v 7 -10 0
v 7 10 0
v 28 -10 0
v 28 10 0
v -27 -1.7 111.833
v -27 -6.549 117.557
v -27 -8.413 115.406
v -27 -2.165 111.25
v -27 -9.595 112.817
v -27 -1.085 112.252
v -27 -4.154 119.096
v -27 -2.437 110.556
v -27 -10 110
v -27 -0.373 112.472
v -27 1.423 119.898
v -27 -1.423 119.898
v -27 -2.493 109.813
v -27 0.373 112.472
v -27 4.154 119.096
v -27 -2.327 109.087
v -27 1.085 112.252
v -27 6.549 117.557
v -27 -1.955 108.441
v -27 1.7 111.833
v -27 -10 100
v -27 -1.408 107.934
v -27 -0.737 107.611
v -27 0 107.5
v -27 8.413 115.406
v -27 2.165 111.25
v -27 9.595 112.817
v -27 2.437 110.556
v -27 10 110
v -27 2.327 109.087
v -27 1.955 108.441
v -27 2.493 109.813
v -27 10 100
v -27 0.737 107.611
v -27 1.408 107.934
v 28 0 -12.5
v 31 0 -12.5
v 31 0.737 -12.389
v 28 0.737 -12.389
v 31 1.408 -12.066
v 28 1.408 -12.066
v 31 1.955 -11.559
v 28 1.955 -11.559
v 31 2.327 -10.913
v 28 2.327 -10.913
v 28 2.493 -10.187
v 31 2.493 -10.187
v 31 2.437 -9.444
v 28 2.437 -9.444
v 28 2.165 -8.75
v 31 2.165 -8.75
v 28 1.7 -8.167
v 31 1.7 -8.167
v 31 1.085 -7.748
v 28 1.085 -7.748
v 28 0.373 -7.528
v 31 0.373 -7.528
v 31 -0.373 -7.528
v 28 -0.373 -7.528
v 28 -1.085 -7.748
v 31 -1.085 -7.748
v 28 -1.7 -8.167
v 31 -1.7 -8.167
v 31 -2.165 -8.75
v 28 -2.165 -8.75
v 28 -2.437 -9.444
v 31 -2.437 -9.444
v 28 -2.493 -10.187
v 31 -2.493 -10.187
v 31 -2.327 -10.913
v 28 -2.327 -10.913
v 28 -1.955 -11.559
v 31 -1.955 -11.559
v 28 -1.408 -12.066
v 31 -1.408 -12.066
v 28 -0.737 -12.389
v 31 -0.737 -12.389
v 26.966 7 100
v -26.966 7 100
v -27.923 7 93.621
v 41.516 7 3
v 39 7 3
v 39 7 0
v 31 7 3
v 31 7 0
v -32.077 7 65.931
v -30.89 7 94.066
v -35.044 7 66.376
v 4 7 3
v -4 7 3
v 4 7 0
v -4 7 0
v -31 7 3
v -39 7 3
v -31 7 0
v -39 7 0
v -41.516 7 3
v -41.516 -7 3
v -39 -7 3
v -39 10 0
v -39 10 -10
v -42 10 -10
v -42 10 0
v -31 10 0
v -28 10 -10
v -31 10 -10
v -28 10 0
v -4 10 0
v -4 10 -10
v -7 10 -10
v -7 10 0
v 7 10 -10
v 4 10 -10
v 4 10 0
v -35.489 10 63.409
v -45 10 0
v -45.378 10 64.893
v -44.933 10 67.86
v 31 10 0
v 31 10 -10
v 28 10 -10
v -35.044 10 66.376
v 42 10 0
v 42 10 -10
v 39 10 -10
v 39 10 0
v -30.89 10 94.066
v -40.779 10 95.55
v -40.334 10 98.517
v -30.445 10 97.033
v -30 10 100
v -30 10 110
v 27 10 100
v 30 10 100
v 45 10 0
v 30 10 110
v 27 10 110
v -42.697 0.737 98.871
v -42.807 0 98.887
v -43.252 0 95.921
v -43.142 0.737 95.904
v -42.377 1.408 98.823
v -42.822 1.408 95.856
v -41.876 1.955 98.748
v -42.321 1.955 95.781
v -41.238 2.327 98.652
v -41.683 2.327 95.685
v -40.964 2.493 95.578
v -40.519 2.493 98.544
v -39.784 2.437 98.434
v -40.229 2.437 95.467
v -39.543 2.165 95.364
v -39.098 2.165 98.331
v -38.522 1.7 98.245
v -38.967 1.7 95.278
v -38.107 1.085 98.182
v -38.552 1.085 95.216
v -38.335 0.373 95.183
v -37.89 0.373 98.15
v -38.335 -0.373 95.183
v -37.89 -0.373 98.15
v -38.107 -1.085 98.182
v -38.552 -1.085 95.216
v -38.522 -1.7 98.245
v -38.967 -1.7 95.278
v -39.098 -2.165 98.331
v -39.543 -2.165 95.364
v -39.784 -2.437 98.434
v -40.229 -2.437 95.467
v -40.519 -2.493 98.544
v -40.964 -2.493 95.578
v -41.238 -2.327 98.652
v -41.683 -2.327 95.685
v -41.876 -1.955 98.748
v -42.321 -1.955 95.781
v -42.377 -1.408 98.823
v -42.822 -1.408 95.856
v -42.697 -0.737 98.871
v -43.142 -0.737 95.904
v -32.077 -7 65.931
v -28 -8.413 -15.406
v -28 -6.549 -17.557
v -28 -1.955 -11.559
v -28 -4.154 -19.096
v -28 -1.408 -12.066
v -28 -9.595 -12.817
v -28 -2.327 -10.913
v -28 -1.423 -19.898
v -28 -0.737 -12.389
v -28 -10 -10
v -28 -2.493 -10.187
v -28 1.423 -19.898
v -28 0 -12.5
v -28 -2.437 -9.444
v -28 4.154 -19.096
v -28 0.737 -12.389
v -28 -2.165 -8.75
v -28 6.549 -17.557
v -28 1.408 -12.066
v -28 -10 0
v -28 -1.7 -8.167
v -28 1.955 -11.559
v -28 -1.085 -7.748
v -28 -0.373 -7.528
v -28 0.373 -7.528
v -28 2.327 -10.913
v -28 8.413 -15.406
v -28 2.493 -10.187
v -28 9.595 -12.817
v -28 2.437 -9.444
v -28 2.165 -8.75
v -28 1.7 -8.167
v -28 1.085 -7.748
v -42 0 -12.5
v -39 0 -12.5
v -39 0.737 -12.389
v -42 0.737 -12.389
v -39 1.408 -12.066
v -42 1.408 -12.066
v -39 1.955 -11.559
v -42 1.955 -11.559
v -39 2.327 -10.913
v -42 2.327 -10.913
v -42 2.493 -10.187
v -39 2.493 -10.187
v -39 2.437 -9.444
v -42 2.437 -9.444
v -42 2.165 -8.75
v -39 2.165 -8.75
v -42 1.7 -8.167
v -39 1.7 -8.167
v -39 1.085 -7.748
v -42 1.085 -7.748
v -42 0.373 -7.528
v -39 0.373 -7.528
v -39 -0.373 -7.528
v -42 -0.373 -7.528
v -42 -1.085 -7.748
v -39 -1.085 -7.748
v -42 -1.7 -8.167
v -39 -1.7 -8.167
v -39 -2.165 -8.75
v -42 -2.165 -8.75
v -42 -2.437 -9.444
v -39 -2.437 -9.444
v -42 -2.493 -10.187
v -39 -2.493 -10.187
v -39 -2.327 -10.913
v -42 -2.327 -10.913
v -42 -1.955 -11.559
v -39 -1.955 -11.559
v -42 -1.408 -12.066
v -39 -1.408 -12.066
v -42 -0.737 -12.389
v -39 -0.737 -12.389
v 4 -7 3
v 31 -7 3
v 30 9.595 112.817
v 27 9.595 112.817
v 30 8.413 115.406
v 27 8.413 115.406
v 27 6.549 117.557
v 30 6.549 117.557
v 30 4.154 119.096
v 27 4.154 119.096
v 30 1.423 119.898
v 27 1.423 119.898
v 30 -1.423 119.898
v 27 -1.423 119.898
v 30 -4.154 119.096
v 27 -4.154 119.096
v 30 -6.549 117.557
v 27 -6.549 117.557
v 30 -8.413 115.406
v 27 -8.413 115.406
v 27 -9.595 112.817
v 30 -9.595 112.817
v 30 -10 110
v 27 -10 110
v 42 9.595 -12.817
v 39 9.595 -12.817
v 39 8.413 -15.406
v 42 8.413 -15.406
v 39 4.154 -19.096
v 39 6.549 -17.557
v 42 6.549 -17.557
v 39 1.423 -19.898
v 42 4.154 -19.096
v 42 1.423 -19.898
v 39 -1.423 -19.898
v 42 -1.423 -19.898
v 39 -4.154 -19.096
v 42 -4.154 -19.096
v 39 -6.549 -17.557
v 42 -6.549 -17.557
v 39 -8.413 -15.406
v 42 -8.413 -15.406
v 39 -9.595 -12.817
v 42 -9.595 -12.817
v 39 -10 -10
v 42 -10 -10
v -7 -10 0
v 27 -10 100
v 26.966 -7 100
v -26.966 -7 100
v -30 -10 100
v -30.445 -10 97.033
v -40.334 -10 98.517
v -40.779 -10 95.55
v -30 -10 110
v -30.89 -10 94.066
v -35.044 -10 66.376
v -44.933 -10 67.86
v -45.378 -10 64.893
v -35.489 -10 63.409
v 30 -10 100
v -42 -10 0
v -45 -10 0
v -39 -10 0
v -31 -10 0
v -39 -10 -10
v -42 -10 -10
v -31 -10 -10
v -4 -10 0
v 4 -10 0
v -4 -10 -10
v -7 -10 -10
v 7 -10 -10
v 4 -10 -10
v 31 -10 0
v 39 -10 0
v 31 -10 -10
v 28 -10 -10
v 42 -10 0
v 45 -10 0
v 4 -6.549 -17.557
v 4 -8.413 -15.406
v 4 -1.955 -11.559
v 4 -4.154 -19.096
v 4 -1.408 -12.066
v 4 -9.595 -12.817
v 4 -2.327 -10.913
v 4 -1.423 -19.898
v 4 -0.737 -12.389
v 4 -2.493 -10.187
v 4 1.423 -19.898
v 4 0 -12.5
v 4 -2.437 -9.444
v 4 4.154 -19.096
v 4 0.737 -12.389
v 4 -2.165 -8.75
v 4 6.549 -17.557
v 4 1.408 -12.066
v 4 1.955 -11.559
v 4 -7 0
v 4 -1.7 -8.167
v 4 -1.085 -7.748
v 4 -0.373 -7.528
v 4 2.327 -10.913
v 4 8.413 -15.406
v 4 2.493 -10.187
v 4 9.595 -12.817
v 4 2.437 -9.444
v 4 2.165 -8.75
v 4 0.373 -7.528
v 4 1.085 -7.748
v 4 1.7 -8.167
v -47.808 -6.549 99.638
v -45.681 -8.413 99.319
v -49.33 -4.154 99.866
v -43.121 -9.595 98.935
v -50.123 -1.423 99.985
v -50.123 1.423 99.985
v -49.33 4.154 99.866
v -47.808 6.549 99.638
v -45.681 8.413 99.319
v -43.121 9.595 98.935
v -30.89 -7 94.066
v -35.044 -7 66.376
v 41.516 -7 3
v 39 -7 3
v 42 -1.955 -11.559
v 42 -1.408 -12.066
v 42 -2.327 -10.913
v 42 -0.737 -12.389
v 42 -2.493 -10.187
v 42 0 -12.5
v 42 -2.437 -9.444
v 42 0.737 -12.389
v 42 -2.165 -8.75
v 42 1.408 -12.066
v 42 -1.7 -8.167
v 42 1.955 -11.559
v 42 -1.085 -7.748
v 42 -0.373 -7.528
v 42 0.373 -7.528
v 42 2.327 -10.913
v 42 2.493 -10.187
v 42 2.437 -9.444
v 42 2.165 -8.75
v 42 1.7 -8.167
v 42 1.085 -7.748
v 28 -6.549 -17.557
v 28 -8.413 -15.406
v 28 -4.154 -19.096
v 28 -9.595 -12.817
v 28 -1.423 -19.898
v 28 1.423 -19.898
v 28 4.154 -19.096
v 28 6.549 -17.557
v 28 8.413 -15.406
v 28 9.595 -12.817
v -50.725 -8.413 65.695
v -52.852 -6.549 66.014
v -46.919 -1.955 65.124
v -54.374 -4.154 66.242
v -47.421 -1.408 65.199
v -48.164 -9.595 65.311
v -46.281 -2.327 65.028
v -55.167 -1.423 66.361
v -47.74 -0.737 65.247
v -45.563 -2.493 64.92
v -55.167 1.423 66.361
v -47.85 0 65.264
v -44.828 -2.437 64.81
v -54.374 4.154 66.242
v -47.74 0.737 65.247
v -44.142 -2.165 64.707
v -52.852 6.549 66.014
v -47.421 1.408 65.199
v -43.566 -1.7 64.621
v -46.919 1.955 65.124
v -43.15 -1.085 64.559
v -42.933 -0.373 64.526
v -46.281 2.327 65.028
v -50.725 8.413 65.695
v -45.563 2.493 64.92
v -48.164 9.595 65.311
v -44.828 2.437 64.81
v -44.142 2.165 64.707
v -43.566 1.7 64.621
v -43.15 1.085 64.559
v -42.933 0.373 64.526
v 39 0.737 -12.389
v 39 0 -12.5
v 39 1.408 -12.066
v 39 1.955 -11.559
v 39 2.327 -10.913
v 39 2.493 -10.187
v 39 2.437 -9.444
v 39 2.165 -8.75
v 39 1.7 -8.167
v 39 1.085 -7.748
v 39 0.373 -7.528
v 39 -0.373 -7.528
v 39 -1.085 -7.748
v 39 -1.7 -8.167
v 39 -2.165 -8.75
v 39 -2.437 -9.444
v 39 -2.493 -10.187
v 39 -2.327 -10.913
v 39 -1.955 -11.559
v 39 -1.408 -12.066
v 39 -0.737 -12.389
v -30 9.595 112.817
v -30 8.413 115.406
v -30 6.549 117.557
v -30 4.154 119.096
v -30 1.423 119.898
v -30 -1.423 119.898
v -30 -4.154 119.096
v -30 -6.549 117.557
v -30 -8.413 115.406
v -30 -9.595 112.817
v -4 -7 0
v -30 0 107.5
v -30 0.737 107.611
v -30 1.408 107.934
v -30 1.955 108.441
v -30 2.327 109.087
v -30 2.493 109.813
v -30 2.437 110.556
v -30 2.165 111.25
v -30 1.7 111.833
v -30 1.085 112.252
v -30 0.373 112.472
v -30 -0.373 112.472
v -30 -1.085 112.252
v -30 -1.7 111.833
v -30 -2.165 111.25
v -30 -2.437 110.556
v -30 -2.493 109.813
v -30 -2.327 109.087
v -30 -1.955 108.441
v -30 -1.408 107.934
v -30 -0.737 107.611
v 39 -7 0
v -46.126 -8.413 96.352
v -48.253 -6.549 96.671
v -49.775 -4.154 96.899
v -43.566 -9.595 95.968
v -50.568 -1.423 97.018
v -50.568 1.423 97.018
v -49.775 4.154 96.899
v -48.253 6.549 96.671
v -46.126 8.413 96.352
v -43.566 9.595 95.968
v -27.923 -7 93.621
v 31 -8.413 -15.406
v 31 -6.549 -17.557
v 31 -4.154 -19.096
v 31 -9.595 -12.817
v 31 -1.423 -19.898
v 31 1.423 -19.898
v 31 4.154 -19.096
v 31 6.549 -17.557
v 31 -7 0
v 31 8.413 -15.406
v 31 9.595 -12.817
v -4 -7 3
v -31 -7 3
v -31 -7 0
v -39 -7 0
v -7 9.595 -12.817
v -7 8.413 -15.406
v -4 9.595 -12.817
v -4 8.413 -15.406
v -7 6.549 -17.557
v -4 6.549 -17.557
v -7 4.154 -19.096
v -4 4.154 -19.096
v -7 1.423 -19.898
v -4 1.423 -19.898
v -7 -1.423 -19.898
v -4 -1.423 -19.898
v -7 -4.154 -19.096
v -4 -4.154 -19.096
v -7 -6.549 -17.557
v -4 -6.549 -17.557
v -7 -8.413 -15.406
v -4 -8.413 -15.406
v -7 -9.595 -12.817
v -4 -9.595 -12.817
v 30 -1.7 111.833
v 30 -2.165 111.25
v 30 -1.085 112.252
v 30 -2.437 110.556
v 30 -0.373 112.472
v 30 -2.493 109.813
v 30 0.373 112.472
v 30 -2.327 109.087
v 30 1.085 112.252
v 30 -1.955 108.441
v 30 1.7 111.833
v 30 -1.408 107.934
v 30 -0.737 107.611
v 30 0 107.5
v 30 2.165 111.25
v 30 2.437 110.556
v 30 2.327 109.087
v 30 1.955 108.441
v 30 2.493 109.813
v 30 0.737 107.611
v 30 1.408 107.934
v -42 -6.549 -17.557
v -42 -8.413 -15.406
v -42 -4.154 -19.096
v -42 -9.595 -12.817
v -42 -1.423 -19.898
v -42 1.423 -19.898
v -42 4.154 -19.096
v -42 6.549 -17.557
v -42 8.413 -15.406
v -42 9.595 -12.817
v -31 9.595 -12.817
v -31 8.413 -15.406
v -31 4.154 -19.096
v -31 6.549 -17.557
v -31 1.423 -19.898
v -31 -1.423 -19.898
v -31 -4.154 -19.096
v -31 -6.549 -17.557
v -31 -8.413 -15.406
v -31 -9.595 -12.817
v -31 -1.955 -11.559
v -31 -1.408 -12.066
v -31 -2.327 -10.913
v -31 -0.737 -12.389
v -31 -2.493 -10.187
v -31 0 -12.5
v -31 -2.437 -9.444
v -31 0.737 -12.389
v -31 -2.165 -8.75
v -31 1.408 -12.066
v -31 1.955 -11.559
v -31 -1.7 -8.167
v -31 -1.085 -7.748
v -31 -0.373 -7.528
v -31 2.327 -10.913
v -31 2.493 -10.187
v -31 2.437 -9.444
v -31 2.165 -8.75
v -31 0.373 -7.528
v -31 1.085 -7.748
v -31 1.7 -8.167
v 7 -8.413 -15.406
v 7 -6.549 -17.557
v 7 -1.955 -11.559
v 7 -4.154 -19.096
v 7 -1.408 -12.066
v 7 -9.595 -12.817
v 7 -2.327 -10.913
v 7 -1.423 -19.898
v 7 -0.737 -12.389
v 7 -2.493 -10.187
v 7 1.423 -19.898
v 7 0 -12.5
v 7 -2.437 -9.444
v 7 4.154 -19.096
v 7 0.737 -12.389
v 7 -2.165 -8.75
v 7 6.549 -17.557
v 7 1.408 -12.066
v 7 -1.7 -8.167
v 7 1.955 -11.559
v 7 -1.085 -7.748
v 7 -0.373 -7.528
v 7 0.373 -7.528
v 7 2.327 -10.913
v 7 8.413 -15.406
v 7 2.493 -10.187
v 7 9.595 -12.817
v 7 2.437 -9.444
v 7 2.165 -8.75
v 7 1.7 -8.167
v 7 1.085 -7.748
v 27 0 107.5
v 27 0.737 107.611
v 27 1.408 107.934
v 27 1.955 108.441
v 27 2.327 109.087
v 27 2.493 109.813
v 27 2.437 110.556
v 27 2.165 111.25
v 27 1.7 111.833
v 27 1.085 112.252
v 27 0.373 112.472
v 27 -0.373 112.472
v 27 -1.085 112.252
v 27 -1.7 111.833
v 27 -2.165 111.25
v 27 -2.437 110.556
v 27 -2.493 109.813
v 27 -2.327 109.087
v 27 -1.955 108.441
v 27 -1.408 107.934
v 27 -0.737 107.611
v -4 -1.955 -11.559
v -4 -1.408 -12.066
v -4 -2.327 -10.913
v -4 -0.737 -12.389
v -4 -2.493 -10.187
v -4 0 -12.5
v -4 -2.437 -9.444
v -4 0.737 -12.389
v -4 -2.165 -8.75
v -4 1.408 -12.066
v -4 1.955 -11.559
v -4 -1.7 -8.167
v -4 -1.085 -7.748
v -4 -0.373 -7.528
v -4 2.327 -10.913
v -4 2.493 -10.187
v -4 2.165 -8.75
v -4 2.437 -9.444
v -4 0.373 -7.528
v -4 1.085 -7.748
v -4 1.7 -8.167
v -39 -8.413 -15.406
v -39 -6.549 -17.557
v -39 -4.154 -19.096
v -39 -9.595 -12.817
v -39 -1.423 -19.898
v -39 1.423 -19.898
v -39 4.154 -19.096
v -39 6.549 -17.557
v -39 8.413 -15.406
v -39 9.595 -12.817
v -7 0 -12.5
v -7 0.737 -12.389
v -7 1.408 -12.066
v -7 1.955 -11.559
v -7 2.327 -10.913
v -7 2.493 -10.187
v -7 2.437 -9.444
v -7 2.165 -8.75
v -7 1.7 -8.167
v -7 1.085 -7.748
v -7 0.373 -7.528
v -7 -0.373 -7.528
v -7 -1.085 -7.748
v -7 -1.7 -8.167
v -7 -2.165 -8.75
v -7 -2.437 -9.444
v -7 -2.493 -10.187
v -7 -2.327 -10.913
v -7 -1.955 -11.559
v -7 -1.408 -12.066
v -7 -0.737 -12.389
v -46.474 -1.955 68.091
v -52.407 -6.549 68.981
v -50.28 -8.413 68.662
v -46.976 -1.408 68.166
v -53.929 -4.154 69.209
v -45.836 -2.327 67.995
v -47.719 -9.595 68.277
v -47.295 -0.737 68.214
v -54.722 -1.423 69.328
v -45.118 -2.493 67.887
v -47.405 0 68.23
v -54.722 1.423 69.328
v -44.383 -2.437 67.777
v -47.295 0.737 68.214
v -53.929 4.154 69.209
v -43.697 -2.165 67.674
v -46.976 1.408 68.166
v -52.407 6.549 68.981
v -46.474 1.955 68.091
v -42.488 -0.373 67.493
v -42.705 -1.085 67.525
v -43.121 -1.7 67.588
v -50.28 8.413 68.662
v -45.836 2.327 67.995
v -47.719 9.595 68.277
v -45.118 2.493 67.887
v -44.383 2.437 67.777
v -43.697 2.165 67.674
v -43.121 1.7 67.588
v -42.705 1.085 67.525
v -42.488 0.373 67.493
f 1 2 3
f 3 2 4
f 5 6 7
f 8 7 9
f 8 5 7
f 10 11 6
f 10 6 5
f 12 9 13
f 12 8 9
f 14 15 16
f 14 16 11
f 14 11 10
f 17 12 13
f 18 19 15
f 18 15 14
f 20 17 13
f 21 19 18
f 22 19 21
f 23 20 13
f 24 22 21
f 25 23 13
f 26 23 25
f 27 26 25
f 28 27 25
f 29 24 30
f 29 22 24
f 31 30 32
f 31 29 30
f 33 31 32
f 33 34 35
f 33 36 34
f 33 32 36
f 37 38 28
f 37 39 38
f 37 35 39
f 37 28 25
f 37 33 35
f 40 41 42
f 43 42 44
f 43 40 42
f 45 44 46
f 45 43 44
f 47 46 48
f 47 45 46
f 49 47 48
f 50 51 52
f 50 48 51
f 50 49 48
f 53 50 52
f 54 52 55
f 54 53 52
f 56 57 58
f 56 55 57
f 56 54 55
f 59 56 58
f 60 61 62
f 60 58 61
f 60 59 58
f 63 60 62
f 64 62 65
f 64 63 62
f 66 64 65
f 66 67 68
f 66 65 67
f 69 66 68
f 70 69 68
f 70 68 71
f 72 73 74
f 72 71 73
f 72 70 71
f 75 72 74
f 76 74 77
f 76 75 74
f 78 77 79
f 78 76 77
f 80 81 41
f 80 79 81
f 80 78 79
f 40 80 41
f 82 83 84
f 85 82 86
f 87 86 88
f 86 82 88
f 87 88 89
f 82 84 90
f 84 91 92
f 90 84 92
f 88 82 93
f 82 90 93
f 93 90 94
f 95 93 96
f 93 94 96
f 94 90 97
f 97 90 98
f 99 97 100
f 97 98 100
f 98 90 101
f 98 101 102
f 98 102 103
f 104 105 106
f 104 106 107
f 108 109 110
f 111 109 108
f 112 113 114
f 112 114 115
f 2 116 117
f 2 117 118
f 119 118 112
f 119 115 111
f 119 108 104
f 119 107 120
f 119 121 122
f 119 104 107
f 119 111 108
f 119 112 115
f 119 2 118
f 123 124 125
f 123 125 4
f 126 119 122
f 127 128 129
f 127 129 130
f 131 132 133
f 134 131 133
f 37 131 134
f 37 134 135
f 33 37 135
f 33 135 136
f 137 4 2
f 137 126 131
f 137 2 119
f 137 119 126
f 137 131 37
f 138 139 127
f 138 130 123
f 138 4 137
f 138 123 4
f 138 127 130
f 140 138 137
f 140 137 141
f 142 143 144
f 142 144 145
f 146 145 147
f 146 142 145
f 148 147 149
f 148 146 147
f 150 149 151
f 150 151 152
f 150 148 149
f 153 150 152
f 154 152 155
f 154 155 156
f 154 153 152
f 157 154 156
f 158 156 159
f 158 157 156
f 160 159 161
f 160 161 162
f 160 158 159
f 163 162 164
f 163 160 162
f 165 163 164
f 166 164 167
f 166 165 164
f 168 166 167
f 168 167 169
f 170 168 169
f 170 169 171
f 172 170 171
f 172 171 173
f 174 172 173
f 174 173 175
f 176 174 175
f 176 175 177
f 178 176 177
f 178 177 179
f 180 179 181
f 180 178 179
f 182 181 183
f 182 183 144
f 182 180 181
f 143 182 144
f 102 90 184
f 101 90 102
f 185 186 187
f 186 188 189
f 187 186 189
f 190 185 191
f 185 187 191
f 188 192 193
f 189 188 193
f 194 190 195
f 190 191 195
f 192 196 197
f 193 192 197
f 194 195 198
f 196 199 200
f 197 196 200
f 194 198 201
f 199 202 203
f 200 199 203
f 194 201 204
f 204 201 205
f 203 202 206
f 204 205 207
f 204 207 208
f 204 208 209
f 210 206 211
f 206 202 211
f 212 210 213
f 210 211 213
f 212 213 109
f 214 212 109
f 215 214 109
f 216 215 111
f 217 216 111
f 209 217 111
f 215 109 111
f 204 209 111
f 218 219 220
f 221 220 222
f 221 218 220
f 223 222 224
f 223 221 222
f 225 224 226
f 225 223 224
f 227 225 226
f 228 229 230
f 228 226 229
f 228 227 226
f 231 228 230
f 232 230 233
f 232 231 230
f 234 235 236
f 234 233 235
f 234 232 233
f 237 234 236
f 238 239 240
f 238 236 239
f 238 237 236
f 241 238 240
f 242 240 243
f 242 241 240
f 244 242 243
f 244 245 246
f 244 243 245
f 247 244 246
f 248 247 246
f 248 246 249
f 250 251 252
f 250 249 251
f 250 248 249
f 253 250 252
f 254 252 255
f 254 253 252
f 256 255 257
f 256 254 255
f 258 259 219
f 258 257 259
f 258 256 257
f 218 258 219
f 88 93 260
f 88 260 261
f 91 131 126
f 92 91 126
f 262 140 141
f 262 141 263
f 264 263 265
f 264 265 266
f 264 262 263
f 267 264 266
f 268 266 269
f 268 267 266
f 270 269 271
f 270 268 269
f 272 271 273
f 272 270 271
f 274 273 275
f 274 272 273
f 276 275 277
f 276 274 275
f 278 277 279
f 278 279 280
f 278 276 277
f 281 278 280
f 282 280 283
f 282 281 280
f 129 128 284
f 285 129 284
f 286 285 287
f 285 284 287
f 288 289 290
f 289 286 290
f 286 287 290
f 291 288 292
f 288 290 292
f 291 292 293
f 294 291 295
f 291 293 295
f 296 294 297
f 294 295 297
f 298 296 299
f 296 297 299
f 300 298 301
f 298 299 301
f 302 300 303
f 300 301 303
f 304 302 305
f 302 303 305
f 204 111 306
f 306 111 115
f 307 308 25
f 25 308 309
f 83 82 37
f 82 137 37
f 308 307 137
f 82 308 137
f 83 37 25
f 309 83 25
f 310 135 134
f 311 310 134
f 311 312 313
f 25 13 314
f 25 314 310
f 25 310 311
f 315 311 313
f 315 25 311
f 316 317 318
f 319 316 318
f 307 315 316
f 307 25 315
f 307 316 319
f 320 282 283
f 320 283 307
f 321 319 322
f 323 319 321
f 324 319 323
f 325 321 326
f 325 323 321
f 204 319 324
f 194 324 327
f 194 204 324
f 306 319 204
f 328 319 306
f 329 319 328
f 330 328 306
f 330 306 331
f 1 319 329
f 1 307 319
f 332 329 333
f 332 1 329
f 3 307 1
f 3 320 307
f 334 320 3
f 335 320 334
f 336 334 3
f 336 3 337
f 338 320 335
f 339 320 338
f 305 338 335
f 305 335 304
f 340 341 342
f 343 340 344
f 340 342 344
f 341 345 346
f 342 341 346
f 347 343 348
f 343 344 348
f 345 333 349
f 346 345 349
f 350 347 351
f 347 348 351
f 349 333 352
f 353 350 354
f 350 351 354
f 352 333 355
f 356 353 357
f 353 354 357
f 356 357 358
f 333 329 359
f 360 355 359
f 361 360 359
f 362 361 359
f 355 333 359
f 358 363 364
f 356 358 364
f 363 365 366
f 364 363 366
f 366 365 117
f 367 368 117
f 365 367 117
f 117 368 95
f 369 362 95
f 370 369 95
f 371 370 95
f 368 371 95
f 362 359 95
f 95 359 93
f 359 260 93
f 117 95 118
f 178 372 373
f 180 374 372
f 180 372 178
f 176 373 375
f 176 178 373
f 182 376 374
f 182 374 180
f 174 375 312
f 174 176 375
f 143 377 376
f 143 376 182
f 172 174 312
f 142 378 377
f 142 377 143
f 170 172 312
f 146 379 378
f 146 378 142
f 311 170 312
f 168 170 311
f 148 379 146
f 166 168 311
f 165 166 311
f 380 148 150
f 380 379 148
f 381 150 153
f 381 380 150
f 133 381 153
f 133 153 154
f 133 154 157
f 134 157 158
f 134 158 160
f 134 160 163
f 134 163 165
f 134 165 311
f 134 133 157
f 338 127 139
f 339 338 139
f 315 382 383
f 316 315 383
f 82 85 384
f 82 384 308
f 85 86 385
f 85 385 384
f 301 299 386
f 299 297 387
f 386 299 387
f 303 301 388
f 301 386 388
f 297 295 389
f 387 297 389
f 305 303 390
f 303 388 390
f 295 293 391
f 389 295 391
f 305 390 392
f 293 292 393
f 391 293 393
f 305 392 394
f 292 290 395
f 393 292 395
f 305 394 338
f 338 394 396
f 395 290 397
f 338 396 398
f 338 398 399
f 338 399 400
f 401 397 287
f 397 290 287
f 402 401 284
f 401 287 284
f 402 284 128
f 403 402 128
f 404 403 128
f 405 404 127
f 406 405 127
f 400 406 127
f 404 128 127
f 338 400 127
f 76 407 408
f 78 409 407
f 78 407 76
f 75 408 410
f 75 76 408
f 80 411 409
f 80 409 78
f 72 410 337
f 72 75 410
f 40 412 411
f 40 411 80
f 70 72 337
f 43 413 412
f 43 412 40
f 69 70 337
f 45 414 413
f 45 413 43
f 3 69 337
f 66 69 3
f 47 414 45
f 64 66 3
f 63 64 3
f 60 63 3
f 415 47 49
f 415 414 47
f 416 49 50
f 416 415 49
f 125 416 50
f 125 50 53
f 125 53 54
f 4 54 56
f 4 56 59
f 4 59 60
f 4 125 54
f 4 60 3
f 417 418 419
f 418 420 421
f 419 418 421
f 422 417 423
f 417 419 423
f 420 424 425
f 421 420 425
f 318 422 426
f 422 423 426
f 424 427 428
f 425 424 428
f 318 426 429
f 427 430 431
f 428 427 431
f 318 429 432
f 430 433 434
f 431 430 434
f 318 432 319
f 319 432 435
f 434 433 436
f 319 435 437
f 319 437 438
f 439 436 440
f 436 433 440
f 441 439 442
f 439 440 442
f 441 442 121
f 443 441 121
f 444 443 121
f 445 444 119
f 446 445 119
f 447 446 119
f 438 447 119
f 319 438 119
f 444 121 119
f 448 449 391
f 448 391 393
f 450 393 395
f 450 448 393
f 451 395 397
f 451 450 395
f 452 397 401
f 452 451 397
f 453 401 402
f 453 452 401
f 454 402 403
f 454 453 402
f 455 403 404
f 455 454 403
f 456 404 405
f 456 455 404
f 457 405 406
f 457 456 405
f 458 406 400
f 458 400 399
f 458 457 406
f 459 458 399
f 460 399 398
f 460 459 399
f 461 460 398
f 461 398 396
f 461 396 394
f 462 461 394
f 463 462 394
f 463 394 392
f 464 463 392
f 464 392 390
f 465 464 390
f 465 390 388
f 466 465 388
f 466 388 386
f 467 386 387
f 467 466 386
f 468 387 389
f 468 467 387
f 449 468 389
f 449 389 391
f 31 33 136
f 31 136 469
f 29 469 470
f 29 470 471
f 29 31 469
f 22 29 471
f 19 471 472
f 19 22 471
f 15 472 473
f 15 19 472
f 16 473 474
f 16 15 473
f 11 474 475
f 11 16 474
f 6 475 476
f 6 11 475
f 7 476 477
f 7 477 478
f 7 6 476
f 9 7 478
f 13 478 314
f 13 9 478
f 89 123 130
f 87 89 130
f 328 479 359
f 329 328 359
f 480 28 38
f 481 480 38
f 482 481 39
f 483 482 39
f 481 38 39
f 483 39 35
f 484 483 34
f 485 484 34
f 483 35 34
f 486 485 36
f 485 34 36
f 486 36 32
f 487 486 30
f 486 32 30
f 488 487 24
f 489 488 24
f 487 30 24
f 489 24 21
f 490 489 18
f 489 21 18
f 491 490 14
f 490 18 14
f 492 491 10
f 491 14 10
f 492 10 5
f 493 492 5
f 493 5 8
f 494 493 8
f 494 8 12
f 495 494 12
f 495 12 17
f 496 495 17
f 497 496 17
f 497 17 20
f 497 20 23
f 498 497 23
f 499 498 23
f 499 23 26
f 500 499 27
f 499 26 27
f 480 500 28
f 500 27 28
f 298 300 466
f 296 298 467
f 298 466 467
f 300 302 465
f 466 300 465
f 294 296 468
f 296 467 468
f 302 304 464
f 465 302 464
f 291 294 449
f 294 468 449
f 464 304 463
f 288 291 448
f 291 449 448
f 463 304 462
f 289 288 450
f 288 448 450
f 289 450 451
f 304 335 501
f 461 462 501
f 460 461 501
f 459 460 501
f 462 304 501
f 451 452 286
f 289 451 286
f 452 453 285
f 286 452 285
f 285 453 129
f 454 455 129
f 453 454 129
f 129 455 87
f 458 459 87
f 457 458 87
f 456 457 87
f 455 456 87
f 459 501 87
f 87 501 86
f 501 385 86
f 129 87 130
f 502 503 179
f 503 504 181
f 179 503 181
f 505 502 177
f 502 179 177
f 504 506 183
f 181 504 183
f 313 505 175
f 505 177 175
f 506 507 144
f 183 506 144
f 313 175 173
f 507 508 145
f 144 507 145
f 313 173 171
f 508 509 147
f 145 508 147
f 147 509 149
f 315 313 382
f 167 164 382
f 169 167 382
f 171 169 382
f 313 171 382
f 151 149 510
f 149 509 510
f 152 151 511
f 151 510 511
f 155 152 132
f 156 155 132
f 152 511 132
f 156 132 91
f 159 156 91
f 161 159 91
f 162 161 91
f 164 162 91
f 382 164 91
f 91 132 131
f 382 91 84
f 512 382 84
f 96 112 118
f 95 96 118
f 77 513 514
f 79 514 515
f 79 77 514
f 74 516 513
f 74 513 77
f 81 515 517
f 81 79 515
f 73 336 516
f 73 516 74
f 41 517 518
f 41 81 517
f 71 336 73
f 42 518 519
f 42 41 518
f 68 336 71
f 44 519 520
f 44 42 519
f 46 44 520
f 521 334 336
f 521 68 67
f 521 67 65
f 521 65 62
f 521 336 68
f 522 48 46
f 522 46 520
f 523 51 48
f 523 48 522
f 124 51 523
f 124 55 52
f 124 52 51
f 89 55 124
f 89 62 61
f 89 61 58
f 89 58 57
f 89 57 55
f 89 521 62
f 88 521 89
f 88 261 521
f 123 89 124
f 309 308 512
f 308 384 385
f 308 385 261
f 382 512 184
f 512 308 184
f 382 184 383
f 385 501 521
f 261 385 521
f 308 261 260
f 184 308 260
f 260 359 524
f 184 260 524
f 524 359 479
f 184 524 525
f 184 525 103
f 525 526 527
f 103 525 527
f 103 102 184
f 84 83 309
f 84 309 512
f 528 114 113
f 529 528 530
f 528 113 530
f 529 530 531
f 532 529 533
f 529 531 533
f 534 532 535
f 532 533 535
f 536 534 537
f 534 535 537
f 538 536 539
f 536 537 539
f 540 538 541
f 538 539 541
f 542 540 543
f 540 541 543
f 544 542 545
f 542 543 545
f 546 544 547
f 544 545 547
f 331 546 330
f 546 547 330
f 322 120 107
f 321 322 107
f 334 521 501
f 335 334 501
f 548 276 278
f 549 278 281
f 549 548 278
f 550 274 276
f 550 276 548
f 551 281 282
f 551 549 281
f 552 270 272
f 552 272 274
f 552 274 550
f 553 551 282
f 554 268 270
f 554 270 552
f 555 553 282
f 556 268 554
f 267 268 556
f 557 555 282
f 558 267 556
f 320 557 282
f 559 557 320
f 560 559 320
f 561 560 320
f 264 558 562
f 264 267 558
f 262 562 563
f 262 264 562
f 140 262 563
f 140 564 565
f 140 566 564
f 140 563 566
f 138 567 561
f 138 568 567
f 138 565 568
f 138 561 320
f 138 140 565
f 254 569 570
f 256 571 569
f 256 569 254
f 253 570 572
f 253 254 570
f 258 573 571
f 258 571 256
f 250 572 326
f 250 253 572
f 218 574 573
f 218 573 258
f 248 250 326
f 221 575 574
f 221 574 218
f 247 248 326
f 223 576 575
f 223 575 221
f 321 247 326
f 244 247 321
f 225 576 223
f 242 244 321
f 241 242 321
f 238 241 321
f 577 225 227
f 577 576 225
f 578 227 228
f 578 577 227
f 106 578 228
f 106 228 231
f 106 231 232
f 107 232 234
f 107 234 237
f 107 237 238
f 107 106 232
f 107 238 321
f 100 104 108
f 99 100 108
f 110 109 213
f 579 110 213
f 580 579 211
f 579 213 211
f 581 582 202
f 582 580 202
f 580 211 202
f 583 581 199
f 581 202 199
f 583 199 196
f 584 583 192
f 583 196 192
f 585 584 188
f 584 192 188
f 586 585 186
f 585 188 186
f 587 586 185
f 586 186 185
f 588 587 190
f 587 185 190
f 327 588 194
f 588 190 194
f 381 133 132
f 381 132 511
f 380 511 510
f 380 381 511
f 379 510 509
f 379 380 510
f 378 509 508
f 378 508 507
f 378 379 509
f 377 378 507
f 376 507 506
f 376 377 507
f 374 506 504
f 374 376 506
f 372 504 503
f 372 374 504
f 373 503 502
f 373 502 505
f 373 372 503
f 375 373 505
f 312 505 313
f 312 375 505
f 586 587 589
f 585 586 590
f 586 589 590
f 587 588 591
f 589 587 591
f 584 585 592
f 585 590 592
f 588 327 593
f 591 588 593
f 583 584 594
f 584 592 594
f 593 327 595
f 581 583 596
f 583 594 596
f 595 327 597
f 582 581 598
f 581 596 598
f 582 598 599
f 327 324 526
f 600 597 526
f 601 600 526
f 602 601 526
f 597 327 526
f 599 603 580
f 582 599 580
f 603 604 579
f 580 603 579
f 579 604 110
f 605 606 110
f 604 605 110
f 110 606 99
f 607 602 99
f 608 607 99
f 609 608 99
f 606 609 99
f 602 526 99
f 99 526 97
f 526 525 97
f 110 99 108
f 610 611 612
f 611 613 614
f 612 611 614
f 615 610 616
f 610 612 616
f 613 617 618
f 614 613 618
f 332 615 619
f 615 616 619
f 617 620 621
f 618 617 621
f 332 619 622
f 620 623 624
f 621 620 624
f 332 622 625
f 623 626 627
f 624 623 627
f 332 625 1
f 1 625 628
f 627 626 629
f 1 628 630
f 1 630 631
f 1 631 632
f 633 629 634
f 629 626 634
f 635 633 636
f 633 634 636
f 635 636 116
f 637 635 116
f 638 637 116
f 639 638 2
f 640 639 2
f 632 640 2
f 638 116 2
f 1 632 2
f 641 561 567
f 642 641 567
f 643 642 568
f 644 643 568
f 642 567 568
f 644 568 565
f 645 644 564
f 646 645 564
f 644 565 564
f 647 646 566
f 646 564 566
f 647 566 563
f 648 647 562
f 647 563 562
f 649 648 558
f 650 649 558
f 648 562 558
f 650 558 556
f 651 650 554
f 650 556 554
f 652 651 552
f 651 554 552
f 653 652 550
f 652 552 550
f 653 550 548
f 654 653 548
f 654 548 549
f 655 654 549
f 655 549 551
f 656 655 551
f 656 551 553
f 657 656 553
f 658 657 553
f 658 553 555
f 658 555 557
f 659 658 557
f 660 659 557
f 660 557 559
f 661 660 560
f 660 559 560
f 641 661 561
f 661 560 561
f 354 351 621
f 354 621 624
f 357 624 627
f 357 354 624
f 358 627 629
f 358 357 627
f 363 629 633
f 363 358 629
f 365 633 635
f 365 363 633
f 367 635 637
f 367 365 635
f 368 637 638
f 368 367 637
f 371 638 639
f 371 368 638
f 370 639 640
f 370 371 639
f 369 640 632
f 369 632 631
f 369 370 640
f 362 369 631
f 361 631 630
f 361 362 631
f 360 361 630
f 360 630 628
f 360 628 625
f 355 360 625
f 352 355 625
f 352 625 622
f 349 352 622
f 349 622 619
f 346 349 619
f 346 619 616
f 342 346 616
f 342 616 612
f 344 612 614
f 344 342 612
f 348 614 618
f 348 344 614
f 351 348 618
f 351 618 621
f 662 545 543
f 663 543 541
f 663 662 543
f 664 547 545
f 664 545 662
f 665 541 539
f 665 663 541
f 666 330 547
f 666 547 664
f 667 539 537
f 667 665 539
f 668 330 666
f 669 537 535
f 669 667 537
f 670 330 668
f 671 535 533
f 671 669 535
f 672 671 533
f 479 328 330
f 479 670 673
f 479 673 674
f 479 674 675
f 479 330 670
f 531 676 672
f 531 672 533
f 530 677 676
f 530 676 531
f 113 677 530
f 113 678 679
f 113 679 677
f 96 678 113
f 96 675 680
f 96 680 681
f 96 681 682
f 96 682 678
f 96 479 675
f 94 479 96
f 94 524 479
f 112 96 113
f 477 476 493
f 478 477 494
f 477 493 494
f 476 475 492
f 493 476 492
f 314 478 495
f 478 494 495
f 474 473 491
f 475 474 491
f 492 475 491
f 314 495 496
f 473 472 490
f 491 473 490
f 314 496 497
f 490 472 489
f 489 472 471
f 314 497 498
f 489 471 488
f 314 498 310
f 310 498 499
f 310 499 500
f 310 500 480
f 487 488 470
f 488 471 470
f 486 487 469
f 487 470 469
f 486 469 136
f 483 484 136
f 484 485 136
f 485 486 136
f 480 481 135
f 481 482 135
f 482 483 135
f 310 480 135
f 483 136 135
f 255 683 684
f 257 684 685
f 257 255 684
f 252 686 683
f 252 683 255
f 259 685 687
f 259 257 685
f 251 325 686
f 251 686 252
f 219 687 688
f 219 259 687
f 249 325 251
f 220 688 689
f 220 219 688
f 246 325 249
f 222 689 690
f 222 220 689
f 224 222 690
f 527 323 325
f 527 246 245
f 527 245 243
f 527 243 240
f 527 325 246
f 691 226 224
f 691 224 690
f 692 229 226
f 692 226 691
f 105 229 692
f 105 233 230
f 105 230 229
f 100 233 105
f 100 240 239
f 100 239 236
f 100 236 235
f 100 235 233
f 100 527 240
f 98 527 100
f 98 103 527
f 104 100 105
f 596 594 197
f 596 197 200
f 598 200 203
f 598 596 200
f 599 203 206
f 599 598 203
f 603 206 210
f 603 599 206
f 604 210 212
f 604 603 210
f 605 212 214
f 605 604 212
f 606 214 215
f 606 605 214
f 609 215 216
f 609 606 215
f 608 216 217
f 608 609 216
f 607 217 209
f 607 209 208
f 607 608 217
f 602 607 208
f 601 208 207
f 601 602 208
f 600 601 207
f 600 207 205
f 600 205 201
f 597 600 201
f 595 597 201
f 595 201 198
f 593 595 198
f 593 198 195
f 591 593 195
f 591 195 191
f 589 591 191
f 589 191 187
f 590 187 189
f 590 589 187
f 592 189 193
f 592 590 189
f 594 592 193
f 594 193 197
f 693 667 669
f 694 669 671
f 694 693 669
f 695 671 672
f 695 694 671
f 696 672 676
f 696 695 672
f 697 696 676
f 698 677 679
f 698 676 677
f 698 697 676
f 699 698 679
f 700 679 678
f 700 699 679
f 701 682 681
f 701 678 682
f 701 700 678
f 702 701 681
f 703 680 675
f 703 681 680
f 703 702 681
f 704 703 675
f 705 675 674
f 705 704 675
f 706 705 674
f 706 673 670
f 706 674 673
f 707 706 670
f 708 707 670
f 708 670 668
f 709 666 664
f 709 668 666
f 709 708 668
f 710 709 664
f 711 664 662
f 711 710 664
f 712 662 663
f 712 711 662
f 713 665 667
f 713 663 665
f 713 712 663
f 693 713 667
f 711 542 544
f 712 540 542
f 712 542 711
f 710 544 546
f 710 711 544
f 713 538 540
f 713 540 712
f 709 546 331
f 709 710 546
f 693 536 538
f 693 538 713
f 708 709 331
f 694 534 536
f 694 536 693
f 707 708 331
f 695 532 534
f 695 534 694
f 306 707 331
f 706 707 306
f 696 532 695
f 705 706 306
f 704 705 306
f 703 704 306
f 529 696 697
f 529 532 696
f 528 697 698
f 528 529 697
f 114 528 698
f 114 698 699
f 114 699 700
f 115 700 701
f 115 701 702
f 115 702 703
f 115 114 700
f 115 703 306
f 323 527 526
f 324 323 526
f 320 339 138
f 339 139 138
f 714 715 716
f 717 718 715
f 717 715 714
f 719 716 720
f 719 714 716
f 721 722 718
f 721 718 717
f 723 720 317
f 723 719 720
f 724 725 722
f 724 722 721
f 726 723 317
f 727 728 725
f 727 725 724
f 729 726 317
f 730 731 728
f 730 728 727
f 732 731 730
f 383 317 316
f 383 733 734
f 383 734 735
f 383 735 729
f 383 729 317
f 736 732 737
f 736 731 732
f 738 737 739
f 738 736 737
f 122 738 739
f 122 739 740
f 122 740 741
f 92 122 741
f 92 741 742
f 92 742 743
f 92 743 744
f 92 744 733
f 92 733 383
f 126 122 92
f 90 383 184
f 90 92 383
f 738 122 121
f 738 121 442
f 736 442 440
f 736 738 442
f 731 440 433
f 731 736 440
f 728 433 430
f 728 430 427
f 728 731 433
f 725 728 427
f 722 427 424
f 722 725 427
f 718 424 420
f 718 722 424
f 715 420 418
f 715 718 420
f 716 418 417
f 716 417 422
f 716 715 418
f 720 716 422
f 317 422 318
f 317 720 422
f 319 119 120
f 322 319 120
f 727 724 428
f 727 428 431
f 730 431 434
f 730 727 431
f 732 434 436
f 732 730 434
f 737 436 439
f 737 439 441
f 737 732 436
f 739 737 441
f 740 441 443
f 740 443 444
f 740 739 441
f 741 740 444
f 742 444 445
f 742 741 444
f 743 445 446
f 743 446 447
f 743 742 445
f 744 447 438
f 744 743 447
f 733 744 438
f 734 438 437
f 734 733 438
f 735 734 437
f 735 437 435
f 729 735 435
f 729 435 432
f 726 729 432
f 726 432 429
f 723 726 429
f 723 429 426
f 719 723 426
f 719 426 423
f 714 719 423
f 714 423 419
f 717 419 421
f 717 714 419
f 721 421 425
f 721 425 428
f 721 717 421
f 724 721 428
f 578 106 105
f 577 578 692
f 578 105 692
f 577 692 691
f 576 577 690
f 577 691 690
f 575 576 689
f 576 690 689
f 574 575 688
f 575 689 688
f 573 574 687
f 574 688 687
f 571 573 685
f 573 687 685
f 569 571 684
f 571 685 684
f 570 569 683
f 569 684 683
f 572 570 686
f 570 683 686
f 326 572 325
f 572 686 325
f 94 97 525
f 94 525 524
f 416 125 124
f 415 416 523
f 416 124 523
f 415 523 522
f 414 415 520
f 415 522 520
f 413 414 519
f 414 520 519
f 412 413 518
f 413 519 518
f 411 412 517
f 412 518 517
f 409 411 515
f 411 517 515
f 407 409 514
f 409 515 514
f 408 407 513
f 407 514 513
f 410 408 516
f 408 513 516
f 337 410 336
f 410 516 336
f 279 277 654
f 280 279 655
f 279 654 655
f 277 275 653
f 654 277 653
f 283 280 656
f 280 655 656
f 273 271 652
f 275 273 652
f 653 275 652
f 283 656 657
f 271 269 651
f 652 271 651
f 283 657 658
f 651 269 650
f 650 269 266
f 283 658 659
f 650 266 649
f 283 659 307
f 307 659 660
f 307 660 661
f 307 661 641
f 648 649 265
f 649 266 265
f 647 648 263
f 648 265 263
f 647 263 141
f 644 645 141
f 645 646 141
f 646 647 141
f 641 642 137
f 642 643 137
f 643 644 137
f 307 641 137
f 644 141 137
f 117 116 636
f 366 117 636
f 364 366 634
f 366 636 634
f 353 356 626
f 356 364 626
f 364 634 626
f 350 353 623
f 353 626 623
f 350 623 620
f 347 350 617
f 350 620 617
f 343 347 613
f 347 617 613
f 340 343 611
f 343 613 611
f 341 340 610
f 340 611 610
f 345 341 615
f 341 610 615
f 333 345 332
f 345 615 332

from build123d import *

# Parameters (mm, degrees)
BOSS_EXTRUDE1_DEPTH = 10
BOSS_EXTRUDE2_START = 35
SKETCH2_R           = 2.5
BOSS_EXTRUDE2_DEPTH = 7
LPATTERN1_COUNT     = 3
LPATTERN1_PITCH     = 35
SHELL1_T            = -3
SKETCH3_W           = 8
SKETCH3_H           = 20
CUT_EXTRUDE1_DEPTH  = 20
BOSS_EXTRUDE3_START = 3
SKETCH5_R           = 2.5
BOSS_EXTRUDE3_DEPTH = 3
LPATTERN2_COUNT     = 2
LPATTERN2_PITCH     = 31
SKETCH6_W           = 28
SKETCH6_H           = 14
CUT_EXTRUDE2_DEPTH  = 3
BOSS_EXTRUDE4_START = 30
SKETCH7_R           = 2.5
BOSS_EXTRUDE4_DEPTH = 3
LPATTERN3_COUNT     = 2
LPATTERN3_PITCH     = 57


with BuildPart() as part:
    # Sketch1 → Boss-Extrude1 (new body, symmetric)
    with BuildSketch(Plane(origin=(0, 0, 0), x_dir=(1, 0, 0), z_dir=(0, 1, 0))):
        Polygon((-45, 0), (45, 0), (30, -100), (-30, -100), align=None)
    extrude(amount=BOSS_EXTRUDE1_DEPTH, both=True)

    # Sketch2 → Boss-Extrude2 (add, symmetric)
    with BuildSketch(Plane(origin=(0, 0, 0), x_dir=(0, 0, -1), z_dir=(1, 0, 0)).offset(BOSS_EXTRUDE2_START)):
        with BuildLine():
            Line((0, 10), (10, 10))
            ThreePointArc((10, 10), (20, 0), (10, -10))
            Line((10, -10), (0, -10))
            Line((0, -10), (0, 10))
        make_face()
        with Locations((10, 0)):
            Circle(SKETCH2_R, mode=Mode.SUBTRACT)
    boss_extrude2 = extrude(amount=BOSS_EXTRUDE2_DEPTH, both=True)

    # LPattern1: Boss-Extrude2 ×3
    with Locations(*[(-i * LPATTERN1_PITCH, 0, 0) for i in range(1, LPATTERN1_COUNT)]):
        add(boss_extrude2)

    # Shell1
    shell1_openings = [part.faces().sort_by_distance(p)[0] for p in [
        (0, 0, 100),
    ]]
    offset(amount=SHELL1_T, openings=shell1_openings, kind=Kind.INTERSECTION)

    # Sketch3 → Cut-Extrude1 (cut)
    with BuildSketch(Plane.XY):
        with Locations((35, 0)):
            Rectangle(SKETCH3_W, SKETCH3_H)
        Rectangle(SKETCH3_W, SKETCH3_H)
        with Locations((-35, 0)):
            Rectangle(SKETCH3_W, SKETCH3_H)
    extrude(amount=-CUT_EXTRUDE1_DEPTH, mode=Mode.SUBTRACT)

    # Sketch5 → Boss-Extrude3 (add)
    with BuildSketch(Plane(origin=(14.009779951, 0, 93.398533007), x_dir=(-0.988936353, 0, 0.148340453), z_dir=(-0.148340453, 0, -0.988936353)).offset(BOSS_EXTRUDE3_START)):
        with BuildLine():
            Line((44.502135879, 10), (54.502135879, 10))
            ThreePointArc((54.502135879, 10), (64.502135879, 0), (54.502135879, -10))
            Line((54.502135879, -10), (44.502135879, -10))
            Line((44.502135879, -10), (44.502135879, 10))
        make_face()
        with Locations((54.502135879, 0)):
            Circle(SKETCH5_R, mode=Mode.SUBTRACT)
    boss_extrude3 = extrude(amount=BOSS_EXTRUDE3_DEPTH)

    # LPattern2: Boss-Extrude3 ×2
    with Locations(*[Vector(-0.148340453, 0, -0.988936353) * (i * LPATTERN2_PITCH) for i in range(1, LPATTERN2_COUNT)]):
        add(boss_extrude3)

    # Sketch6 → Cut-Extrude2 (cut)
    with BuildSketch(Plane(origin=(-44.009779951, 0, 6.601466993), x_dir=(-0.148340453, 0, -0.988936353), z_dir=(0.988936353, 0, -0.148340453))):
        with Locations((-74.443421699, 0)):
            Rectangle(SKETCH6_W, SKETCH6_H)
    extrude(amount=CUT_EXTRUDE2_DEPTH, mode=Mode.SUBTRACT)

    # Sketch7 → Boss-Extrude4 (add)
    with BuildSketch(Plane(origin=(0, 0, 0), x_dir=(0, 0, -1), z_dir=(1, 0, 0)).offset(BOSS_EXTRUDE4_START)):
        with BuildLine():
            Line((-100, 10), (-110, 10))
            ThreePointArc((-110, 10), (-120, 0), (-110, -10))
            Line((-110, -10), (-100, -10))
            Line((-100, -10), (-100, 10))
        make_face()
        with Locations((-110, 0)):
            Circle(SKETCH7_R, mode=Mode.SUBTRACT)
    boss_extrude4 = extrude(amount=-BOSS_EXTRUDE4_DEPTH)

    # LPattern3: Boss-Extrude4 ×2
    with Locations(*[(-i * LPATTERN3_PITCH, 0, 0) for i in range(1, LPATTERN3_COUNT)]):
        add(boss_extrude4)


solid = part.part
